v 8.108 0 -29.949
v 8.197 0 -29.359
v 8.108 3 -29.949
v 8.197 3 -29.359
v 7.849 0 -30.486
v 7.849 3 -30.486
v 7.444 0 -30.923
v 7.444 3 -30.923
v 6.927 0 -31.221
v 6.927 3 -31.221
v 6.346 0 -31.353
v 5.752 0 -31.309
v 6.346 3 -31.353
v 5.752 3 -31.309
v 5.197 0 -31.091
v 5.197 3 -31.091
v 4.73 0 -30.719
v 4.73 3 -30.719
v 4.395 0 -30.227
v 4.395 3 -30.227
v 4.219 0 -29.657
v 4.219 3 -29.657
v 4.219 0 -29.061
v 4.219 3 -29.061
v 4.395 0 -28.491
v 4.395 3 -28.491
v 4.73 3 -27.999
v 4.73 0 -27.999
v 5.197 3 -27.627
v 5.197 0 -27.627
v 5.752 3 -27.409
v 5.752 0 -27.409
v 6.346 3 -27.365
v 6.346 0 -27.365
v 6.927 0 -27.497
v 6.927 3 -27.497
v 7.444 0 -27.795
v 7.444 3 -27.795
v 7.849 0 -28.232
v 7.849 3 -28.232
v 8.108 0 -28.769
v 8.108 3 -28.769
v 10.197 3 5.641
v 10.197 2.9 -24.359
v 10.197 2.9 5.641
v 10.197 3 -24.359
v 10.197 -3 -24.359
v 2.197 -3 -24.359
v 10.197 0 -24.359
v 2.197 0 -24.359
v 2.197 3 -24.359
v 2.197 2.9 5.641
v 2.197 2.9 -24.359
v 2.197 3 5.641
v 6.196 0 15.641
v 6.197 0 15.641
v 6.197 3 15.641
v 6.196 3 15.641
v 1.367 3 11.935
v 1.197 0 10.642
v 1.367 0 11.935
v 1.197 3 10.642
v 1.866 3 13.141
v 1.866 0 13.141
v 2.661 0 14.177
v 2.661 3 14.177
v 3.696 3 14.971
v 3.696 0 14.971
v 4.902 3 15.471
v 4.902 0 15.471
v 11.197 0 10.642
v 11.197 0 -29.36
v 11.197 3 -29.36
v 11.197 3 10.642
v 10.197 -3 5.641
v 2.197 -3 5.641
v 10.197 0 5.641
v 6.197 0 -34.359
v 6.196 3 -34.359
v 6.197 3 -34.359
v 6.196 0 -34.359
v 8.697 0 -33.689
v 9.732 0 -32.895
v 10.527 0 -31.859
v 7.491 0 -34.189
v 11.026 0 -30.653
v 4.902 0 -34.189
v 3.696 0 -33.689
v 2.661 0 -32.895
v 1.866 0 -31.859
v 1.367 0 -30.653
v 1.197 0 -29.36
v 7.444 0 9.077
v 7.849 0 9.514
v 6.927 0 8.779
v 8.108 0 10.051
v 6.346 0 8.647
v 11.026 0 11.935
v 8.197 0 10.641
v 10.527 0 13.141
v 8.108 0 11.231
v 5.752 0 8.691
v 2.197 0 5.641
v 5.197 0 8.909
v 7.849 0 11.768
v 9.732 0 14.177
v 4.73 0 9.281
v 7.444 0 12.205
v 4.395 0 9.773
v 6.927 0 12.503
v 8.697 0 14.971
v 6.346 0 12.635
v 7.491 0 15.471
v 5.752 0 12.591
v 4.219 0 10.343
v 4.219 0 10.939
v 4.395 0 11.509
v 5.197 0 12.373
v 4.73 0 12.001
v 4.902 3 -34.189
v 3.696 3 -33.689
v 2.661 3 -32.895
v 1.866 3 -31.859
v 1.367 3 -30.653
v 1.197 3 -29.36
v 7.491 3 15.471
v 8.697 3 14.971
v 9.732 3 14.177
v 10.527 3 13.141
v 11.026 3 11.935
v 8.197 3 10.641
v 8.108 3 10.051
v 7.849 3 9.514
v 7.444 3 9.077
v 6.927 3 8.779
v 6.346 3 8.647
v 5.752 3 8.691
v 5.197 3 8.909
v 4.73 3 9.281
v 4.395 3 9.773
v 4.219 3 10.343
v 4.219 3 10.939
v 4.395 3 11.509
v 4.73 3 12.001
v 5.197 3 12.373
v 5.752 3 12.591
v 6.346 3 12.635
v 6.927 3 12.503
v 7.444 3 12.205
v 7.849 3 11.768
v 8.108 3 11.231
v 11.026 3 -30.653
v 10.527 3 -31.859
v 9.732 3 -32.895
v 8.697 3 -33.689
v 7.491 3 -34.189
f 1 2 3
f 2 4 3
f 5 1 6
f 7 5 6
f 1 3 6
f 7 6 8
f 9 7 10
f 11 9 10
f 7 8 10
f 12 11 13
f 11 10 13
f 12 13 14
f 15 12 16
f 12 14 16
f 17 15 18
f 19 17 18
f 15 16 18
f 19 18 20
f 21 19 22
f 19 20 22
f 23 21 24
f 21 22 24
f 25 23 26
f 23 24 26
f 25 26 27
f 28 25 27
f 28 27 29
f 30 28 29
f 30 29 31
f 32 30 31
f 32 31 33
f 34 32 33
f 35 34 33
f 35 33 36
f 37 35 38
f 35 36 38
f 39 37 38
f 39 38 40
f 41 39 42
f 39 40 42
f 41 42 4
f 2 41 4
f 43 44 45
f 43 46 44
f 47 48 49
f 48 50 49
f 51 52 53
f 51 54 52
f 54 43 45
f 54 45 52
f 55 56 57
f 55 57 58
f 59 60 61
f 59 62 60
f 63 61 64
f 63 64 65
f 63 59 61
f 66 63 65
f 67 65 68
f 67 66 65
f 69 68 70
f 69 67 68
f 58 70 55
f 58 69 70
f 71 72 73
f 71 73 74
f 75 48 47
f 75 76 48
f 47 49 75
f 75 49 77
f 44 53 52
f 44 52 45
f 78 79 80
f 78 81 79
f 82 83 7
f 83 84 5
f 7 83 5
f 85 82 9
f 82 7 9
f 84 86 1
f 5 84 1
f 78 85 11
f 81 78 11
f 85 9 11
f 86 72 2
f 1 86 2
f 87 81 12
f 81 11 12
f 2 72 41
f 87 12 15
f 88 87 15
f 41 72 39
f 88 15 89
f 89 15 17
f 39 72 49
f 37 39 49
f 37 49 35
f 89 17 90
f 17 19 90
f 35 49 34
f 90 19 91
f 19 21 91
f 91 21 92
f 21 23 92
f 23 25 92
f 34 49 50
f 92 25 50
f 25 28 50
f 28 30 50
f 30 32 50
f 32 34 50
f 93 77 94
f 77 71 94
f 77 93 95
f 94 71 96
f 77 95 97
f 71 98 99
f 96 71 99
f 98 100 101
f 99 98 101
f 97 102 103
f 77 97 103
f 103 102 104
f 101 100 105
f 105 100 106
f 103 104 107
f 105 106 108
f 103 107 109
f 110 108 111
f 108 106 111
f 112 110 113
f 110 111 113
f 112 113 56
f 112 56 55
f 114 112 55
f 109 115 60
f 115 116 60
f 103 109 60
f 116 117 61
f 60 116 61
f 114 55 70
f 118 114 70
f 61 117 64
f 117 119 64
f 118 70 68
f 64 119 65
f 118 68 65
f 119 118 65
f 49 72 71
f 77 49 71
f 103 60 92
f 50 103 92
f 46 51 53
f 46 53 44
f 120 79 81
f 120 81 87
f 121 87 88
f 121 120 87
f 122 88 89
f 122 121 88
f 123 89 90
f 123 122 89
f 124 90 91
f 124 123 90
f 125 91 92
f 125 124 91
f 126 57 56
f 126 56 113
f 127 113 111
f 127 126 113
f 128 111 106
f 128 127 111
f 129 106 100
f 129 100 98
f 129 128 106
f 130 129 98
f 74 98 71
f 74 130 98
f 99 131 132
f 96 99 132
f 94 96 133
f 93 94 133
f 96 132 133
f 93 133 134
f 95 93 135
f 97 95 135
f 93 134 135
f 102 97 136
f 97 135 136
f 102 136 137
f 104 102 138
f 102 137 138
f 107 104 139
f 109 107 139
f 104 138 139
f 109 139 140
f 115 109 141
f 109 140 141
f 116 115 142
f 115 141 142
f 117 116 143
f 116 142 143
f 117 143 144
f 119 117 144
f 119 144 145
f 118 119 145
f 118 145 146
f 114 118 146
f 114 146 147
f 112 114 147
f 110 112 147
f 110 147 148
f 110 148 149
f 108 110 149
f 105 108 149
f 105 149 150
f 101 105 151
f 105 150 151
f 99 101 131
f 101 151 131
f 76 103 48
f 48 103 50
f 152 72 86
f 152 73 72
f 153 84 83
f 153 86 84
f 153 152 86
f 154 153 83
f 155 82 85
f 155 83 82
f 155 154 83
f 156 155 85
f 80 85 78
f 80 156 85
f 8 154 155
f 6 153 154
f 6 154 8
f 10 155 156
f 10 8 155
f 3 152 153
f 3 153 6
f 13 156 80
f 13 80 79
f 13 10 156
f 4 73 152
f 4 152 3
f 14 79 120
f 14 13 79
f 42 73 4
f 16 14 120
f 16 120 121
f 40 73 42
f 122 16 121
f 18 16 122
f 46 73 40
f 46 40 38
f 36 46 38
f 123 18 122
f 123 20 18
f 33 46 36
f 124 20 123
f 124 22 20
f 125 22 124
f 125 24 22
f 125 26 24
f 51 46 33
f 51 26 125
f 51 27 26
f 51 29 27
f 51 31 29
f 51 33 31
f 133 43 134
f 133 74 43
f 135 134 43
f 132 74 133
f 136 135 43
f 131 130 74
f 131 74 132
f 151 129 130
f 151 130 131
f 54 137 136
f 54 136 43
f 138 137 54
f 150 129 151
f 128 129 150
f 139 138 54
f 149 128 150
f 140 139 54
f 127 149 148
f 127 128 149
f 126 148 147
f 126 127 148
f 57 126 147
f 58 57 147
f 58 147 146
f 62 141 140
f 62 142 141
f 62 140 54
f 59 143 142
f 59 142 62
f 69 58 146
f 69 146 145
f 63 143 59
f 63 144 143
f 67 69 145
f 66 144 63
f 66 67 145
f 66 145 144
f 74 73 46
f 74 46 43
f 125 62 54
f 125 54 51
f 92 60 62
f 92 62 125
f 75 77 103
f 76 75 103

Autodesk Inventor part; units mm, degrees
ref_plane "YZ Plane" through (0, 0, 0) normal (1, 0, 0) x (0, 1, 0)
ref_plane "XZ Plane" through (0, 0, 0) normal (0, 1, 0) x (-1, 0, 0)
ref_plane "XY Plane" through (0, 0, 0) normal (0, 0, 1) x (1, 0, 0)
sketch "Эскиз1" plane through (0, 0, 0) normal (0, 1, 0) x (-1, 0, 0)
  line L0 (-11.1966, 15.641) -> (-1.1966, 15.641)
  line L1 (-1.1966, 15.641) -> (-1.1966, -34.359)
  line L2 (-1.1966, -34.359) -> (-11.1966, -34.359)
  line L3 (-11.1966, -34.359) -> (-11.1966, 15.641)
  point P0 (0, 0)
  dimension "d0" = 50
  dimension "d1" = 10
extrude "Выдавливание1" add sketch "Эскиз1" along normal blind 3
fillet "Сопряжение1" radius 5 2 edges at (11.1966, 1.5, -34.359) (1.1966, 1.5, -34.359)
fillet "Сопряжение2" radius 5 2 edges at (11.1966, 1.5, 15.641) (1.1966, 1.5, 15.641)
sketch "Эскиз2" plane through (0, 3, 0) normal (0, 1, 0) x (1, 0, 0)
  line L0 (2.1966, 24.359) -> (10.1966, 24.359)
  line L1 (10.1966, 24.359) -> (10.1966, -5.641)
  line L2 (10.1966, -5.641) -> (2.1966, -5.641)
  line L3 (2.1966, -5.641) -> (2.1966, 24.359)
  arc A0 (11.1966, 29.359) -> (1.1966, 29.359) centre (6.1966, 29.359) ccw projected
  arc A1 (1.1966, -10.641) -> (11.1966, -10.641) centre (6.1966, -10.641) ccw projected
  line L4 (11.1966, -10.641) -> (11.1966, 29.359) projected
  line L5 (1.1966, 29.359) -> (1.1966, -10.641) projected
  point P0 (0, 0)
  point P1 (6.1966, 34.359)
  point P2 (6.1966, 24.359)
  point P3 (6.1966, -15.641)
  point P4 (6.1966, -5.641)
  dimension "d6" = 10
  dimension "d7" = 10
  dimension "d8" = 1
  dimension "d9" = 1
extrude "Выдавливание2" cut sketch "Эскиз2" against normal blind 0.1 contours L0 L1 L2 L3
sketch "Эскиз3" plane through (0, 3, 0) normal (0, 1, 0) x (1, 0, 0)
  circle A0 centre (23.3894, 111.2567) radius 1
  circle A1 centre (6.1966, 29.359) radius 2
  arc A2 (11.1966, 29.359) -> (1.1966, 29.359) centre (6.1966, 29.359) ccw projected
  circle A3 centre (6.1966, -10.641) radius 2
  arc A4 (1.1966, -10.641) -> (11.1966, -10.641) centre (6.1966, -10.641) ccw projected
  point P0 (0, 0)
  point P1 (6.1966, 34.359)
  point P2 (6.1966, -15.641)
  dimension "d12" = 2
  dimension "d13" = 4
  dimension "d14" = 5
  dimension "d15" = 4
extrude "Выдавливание3" cut sketch "Эскиз3" against normal blind 10 contours A1 | A3
sketch "Эскиз4" plane through (0, 0, 0) normal (0, -1, 0) x (1, 0, 0)
  line L0 (10.1966, 5.641) -> (2.1966, 5.641) projected
  line L1 (2.1966, 5.641) -> (2.1966, -24.359) projected
  line L2 (10.1966, 5.641) -> (2.1966, 5.641)
  line L3 (2.1966, 5.641) -> (2.1966, -24.359)
  line L4 (2.1966, -24.359) -> (10.1966, -24.359)
  line L5 (10.1966, -24.359) -> (10.1966, 5.641)
  point P0 (0, 0)
extrude "Выдавливание4" add sketch "Эскиз4" along normal blind 3
properties part number "магнит 2" material "Сталь"
